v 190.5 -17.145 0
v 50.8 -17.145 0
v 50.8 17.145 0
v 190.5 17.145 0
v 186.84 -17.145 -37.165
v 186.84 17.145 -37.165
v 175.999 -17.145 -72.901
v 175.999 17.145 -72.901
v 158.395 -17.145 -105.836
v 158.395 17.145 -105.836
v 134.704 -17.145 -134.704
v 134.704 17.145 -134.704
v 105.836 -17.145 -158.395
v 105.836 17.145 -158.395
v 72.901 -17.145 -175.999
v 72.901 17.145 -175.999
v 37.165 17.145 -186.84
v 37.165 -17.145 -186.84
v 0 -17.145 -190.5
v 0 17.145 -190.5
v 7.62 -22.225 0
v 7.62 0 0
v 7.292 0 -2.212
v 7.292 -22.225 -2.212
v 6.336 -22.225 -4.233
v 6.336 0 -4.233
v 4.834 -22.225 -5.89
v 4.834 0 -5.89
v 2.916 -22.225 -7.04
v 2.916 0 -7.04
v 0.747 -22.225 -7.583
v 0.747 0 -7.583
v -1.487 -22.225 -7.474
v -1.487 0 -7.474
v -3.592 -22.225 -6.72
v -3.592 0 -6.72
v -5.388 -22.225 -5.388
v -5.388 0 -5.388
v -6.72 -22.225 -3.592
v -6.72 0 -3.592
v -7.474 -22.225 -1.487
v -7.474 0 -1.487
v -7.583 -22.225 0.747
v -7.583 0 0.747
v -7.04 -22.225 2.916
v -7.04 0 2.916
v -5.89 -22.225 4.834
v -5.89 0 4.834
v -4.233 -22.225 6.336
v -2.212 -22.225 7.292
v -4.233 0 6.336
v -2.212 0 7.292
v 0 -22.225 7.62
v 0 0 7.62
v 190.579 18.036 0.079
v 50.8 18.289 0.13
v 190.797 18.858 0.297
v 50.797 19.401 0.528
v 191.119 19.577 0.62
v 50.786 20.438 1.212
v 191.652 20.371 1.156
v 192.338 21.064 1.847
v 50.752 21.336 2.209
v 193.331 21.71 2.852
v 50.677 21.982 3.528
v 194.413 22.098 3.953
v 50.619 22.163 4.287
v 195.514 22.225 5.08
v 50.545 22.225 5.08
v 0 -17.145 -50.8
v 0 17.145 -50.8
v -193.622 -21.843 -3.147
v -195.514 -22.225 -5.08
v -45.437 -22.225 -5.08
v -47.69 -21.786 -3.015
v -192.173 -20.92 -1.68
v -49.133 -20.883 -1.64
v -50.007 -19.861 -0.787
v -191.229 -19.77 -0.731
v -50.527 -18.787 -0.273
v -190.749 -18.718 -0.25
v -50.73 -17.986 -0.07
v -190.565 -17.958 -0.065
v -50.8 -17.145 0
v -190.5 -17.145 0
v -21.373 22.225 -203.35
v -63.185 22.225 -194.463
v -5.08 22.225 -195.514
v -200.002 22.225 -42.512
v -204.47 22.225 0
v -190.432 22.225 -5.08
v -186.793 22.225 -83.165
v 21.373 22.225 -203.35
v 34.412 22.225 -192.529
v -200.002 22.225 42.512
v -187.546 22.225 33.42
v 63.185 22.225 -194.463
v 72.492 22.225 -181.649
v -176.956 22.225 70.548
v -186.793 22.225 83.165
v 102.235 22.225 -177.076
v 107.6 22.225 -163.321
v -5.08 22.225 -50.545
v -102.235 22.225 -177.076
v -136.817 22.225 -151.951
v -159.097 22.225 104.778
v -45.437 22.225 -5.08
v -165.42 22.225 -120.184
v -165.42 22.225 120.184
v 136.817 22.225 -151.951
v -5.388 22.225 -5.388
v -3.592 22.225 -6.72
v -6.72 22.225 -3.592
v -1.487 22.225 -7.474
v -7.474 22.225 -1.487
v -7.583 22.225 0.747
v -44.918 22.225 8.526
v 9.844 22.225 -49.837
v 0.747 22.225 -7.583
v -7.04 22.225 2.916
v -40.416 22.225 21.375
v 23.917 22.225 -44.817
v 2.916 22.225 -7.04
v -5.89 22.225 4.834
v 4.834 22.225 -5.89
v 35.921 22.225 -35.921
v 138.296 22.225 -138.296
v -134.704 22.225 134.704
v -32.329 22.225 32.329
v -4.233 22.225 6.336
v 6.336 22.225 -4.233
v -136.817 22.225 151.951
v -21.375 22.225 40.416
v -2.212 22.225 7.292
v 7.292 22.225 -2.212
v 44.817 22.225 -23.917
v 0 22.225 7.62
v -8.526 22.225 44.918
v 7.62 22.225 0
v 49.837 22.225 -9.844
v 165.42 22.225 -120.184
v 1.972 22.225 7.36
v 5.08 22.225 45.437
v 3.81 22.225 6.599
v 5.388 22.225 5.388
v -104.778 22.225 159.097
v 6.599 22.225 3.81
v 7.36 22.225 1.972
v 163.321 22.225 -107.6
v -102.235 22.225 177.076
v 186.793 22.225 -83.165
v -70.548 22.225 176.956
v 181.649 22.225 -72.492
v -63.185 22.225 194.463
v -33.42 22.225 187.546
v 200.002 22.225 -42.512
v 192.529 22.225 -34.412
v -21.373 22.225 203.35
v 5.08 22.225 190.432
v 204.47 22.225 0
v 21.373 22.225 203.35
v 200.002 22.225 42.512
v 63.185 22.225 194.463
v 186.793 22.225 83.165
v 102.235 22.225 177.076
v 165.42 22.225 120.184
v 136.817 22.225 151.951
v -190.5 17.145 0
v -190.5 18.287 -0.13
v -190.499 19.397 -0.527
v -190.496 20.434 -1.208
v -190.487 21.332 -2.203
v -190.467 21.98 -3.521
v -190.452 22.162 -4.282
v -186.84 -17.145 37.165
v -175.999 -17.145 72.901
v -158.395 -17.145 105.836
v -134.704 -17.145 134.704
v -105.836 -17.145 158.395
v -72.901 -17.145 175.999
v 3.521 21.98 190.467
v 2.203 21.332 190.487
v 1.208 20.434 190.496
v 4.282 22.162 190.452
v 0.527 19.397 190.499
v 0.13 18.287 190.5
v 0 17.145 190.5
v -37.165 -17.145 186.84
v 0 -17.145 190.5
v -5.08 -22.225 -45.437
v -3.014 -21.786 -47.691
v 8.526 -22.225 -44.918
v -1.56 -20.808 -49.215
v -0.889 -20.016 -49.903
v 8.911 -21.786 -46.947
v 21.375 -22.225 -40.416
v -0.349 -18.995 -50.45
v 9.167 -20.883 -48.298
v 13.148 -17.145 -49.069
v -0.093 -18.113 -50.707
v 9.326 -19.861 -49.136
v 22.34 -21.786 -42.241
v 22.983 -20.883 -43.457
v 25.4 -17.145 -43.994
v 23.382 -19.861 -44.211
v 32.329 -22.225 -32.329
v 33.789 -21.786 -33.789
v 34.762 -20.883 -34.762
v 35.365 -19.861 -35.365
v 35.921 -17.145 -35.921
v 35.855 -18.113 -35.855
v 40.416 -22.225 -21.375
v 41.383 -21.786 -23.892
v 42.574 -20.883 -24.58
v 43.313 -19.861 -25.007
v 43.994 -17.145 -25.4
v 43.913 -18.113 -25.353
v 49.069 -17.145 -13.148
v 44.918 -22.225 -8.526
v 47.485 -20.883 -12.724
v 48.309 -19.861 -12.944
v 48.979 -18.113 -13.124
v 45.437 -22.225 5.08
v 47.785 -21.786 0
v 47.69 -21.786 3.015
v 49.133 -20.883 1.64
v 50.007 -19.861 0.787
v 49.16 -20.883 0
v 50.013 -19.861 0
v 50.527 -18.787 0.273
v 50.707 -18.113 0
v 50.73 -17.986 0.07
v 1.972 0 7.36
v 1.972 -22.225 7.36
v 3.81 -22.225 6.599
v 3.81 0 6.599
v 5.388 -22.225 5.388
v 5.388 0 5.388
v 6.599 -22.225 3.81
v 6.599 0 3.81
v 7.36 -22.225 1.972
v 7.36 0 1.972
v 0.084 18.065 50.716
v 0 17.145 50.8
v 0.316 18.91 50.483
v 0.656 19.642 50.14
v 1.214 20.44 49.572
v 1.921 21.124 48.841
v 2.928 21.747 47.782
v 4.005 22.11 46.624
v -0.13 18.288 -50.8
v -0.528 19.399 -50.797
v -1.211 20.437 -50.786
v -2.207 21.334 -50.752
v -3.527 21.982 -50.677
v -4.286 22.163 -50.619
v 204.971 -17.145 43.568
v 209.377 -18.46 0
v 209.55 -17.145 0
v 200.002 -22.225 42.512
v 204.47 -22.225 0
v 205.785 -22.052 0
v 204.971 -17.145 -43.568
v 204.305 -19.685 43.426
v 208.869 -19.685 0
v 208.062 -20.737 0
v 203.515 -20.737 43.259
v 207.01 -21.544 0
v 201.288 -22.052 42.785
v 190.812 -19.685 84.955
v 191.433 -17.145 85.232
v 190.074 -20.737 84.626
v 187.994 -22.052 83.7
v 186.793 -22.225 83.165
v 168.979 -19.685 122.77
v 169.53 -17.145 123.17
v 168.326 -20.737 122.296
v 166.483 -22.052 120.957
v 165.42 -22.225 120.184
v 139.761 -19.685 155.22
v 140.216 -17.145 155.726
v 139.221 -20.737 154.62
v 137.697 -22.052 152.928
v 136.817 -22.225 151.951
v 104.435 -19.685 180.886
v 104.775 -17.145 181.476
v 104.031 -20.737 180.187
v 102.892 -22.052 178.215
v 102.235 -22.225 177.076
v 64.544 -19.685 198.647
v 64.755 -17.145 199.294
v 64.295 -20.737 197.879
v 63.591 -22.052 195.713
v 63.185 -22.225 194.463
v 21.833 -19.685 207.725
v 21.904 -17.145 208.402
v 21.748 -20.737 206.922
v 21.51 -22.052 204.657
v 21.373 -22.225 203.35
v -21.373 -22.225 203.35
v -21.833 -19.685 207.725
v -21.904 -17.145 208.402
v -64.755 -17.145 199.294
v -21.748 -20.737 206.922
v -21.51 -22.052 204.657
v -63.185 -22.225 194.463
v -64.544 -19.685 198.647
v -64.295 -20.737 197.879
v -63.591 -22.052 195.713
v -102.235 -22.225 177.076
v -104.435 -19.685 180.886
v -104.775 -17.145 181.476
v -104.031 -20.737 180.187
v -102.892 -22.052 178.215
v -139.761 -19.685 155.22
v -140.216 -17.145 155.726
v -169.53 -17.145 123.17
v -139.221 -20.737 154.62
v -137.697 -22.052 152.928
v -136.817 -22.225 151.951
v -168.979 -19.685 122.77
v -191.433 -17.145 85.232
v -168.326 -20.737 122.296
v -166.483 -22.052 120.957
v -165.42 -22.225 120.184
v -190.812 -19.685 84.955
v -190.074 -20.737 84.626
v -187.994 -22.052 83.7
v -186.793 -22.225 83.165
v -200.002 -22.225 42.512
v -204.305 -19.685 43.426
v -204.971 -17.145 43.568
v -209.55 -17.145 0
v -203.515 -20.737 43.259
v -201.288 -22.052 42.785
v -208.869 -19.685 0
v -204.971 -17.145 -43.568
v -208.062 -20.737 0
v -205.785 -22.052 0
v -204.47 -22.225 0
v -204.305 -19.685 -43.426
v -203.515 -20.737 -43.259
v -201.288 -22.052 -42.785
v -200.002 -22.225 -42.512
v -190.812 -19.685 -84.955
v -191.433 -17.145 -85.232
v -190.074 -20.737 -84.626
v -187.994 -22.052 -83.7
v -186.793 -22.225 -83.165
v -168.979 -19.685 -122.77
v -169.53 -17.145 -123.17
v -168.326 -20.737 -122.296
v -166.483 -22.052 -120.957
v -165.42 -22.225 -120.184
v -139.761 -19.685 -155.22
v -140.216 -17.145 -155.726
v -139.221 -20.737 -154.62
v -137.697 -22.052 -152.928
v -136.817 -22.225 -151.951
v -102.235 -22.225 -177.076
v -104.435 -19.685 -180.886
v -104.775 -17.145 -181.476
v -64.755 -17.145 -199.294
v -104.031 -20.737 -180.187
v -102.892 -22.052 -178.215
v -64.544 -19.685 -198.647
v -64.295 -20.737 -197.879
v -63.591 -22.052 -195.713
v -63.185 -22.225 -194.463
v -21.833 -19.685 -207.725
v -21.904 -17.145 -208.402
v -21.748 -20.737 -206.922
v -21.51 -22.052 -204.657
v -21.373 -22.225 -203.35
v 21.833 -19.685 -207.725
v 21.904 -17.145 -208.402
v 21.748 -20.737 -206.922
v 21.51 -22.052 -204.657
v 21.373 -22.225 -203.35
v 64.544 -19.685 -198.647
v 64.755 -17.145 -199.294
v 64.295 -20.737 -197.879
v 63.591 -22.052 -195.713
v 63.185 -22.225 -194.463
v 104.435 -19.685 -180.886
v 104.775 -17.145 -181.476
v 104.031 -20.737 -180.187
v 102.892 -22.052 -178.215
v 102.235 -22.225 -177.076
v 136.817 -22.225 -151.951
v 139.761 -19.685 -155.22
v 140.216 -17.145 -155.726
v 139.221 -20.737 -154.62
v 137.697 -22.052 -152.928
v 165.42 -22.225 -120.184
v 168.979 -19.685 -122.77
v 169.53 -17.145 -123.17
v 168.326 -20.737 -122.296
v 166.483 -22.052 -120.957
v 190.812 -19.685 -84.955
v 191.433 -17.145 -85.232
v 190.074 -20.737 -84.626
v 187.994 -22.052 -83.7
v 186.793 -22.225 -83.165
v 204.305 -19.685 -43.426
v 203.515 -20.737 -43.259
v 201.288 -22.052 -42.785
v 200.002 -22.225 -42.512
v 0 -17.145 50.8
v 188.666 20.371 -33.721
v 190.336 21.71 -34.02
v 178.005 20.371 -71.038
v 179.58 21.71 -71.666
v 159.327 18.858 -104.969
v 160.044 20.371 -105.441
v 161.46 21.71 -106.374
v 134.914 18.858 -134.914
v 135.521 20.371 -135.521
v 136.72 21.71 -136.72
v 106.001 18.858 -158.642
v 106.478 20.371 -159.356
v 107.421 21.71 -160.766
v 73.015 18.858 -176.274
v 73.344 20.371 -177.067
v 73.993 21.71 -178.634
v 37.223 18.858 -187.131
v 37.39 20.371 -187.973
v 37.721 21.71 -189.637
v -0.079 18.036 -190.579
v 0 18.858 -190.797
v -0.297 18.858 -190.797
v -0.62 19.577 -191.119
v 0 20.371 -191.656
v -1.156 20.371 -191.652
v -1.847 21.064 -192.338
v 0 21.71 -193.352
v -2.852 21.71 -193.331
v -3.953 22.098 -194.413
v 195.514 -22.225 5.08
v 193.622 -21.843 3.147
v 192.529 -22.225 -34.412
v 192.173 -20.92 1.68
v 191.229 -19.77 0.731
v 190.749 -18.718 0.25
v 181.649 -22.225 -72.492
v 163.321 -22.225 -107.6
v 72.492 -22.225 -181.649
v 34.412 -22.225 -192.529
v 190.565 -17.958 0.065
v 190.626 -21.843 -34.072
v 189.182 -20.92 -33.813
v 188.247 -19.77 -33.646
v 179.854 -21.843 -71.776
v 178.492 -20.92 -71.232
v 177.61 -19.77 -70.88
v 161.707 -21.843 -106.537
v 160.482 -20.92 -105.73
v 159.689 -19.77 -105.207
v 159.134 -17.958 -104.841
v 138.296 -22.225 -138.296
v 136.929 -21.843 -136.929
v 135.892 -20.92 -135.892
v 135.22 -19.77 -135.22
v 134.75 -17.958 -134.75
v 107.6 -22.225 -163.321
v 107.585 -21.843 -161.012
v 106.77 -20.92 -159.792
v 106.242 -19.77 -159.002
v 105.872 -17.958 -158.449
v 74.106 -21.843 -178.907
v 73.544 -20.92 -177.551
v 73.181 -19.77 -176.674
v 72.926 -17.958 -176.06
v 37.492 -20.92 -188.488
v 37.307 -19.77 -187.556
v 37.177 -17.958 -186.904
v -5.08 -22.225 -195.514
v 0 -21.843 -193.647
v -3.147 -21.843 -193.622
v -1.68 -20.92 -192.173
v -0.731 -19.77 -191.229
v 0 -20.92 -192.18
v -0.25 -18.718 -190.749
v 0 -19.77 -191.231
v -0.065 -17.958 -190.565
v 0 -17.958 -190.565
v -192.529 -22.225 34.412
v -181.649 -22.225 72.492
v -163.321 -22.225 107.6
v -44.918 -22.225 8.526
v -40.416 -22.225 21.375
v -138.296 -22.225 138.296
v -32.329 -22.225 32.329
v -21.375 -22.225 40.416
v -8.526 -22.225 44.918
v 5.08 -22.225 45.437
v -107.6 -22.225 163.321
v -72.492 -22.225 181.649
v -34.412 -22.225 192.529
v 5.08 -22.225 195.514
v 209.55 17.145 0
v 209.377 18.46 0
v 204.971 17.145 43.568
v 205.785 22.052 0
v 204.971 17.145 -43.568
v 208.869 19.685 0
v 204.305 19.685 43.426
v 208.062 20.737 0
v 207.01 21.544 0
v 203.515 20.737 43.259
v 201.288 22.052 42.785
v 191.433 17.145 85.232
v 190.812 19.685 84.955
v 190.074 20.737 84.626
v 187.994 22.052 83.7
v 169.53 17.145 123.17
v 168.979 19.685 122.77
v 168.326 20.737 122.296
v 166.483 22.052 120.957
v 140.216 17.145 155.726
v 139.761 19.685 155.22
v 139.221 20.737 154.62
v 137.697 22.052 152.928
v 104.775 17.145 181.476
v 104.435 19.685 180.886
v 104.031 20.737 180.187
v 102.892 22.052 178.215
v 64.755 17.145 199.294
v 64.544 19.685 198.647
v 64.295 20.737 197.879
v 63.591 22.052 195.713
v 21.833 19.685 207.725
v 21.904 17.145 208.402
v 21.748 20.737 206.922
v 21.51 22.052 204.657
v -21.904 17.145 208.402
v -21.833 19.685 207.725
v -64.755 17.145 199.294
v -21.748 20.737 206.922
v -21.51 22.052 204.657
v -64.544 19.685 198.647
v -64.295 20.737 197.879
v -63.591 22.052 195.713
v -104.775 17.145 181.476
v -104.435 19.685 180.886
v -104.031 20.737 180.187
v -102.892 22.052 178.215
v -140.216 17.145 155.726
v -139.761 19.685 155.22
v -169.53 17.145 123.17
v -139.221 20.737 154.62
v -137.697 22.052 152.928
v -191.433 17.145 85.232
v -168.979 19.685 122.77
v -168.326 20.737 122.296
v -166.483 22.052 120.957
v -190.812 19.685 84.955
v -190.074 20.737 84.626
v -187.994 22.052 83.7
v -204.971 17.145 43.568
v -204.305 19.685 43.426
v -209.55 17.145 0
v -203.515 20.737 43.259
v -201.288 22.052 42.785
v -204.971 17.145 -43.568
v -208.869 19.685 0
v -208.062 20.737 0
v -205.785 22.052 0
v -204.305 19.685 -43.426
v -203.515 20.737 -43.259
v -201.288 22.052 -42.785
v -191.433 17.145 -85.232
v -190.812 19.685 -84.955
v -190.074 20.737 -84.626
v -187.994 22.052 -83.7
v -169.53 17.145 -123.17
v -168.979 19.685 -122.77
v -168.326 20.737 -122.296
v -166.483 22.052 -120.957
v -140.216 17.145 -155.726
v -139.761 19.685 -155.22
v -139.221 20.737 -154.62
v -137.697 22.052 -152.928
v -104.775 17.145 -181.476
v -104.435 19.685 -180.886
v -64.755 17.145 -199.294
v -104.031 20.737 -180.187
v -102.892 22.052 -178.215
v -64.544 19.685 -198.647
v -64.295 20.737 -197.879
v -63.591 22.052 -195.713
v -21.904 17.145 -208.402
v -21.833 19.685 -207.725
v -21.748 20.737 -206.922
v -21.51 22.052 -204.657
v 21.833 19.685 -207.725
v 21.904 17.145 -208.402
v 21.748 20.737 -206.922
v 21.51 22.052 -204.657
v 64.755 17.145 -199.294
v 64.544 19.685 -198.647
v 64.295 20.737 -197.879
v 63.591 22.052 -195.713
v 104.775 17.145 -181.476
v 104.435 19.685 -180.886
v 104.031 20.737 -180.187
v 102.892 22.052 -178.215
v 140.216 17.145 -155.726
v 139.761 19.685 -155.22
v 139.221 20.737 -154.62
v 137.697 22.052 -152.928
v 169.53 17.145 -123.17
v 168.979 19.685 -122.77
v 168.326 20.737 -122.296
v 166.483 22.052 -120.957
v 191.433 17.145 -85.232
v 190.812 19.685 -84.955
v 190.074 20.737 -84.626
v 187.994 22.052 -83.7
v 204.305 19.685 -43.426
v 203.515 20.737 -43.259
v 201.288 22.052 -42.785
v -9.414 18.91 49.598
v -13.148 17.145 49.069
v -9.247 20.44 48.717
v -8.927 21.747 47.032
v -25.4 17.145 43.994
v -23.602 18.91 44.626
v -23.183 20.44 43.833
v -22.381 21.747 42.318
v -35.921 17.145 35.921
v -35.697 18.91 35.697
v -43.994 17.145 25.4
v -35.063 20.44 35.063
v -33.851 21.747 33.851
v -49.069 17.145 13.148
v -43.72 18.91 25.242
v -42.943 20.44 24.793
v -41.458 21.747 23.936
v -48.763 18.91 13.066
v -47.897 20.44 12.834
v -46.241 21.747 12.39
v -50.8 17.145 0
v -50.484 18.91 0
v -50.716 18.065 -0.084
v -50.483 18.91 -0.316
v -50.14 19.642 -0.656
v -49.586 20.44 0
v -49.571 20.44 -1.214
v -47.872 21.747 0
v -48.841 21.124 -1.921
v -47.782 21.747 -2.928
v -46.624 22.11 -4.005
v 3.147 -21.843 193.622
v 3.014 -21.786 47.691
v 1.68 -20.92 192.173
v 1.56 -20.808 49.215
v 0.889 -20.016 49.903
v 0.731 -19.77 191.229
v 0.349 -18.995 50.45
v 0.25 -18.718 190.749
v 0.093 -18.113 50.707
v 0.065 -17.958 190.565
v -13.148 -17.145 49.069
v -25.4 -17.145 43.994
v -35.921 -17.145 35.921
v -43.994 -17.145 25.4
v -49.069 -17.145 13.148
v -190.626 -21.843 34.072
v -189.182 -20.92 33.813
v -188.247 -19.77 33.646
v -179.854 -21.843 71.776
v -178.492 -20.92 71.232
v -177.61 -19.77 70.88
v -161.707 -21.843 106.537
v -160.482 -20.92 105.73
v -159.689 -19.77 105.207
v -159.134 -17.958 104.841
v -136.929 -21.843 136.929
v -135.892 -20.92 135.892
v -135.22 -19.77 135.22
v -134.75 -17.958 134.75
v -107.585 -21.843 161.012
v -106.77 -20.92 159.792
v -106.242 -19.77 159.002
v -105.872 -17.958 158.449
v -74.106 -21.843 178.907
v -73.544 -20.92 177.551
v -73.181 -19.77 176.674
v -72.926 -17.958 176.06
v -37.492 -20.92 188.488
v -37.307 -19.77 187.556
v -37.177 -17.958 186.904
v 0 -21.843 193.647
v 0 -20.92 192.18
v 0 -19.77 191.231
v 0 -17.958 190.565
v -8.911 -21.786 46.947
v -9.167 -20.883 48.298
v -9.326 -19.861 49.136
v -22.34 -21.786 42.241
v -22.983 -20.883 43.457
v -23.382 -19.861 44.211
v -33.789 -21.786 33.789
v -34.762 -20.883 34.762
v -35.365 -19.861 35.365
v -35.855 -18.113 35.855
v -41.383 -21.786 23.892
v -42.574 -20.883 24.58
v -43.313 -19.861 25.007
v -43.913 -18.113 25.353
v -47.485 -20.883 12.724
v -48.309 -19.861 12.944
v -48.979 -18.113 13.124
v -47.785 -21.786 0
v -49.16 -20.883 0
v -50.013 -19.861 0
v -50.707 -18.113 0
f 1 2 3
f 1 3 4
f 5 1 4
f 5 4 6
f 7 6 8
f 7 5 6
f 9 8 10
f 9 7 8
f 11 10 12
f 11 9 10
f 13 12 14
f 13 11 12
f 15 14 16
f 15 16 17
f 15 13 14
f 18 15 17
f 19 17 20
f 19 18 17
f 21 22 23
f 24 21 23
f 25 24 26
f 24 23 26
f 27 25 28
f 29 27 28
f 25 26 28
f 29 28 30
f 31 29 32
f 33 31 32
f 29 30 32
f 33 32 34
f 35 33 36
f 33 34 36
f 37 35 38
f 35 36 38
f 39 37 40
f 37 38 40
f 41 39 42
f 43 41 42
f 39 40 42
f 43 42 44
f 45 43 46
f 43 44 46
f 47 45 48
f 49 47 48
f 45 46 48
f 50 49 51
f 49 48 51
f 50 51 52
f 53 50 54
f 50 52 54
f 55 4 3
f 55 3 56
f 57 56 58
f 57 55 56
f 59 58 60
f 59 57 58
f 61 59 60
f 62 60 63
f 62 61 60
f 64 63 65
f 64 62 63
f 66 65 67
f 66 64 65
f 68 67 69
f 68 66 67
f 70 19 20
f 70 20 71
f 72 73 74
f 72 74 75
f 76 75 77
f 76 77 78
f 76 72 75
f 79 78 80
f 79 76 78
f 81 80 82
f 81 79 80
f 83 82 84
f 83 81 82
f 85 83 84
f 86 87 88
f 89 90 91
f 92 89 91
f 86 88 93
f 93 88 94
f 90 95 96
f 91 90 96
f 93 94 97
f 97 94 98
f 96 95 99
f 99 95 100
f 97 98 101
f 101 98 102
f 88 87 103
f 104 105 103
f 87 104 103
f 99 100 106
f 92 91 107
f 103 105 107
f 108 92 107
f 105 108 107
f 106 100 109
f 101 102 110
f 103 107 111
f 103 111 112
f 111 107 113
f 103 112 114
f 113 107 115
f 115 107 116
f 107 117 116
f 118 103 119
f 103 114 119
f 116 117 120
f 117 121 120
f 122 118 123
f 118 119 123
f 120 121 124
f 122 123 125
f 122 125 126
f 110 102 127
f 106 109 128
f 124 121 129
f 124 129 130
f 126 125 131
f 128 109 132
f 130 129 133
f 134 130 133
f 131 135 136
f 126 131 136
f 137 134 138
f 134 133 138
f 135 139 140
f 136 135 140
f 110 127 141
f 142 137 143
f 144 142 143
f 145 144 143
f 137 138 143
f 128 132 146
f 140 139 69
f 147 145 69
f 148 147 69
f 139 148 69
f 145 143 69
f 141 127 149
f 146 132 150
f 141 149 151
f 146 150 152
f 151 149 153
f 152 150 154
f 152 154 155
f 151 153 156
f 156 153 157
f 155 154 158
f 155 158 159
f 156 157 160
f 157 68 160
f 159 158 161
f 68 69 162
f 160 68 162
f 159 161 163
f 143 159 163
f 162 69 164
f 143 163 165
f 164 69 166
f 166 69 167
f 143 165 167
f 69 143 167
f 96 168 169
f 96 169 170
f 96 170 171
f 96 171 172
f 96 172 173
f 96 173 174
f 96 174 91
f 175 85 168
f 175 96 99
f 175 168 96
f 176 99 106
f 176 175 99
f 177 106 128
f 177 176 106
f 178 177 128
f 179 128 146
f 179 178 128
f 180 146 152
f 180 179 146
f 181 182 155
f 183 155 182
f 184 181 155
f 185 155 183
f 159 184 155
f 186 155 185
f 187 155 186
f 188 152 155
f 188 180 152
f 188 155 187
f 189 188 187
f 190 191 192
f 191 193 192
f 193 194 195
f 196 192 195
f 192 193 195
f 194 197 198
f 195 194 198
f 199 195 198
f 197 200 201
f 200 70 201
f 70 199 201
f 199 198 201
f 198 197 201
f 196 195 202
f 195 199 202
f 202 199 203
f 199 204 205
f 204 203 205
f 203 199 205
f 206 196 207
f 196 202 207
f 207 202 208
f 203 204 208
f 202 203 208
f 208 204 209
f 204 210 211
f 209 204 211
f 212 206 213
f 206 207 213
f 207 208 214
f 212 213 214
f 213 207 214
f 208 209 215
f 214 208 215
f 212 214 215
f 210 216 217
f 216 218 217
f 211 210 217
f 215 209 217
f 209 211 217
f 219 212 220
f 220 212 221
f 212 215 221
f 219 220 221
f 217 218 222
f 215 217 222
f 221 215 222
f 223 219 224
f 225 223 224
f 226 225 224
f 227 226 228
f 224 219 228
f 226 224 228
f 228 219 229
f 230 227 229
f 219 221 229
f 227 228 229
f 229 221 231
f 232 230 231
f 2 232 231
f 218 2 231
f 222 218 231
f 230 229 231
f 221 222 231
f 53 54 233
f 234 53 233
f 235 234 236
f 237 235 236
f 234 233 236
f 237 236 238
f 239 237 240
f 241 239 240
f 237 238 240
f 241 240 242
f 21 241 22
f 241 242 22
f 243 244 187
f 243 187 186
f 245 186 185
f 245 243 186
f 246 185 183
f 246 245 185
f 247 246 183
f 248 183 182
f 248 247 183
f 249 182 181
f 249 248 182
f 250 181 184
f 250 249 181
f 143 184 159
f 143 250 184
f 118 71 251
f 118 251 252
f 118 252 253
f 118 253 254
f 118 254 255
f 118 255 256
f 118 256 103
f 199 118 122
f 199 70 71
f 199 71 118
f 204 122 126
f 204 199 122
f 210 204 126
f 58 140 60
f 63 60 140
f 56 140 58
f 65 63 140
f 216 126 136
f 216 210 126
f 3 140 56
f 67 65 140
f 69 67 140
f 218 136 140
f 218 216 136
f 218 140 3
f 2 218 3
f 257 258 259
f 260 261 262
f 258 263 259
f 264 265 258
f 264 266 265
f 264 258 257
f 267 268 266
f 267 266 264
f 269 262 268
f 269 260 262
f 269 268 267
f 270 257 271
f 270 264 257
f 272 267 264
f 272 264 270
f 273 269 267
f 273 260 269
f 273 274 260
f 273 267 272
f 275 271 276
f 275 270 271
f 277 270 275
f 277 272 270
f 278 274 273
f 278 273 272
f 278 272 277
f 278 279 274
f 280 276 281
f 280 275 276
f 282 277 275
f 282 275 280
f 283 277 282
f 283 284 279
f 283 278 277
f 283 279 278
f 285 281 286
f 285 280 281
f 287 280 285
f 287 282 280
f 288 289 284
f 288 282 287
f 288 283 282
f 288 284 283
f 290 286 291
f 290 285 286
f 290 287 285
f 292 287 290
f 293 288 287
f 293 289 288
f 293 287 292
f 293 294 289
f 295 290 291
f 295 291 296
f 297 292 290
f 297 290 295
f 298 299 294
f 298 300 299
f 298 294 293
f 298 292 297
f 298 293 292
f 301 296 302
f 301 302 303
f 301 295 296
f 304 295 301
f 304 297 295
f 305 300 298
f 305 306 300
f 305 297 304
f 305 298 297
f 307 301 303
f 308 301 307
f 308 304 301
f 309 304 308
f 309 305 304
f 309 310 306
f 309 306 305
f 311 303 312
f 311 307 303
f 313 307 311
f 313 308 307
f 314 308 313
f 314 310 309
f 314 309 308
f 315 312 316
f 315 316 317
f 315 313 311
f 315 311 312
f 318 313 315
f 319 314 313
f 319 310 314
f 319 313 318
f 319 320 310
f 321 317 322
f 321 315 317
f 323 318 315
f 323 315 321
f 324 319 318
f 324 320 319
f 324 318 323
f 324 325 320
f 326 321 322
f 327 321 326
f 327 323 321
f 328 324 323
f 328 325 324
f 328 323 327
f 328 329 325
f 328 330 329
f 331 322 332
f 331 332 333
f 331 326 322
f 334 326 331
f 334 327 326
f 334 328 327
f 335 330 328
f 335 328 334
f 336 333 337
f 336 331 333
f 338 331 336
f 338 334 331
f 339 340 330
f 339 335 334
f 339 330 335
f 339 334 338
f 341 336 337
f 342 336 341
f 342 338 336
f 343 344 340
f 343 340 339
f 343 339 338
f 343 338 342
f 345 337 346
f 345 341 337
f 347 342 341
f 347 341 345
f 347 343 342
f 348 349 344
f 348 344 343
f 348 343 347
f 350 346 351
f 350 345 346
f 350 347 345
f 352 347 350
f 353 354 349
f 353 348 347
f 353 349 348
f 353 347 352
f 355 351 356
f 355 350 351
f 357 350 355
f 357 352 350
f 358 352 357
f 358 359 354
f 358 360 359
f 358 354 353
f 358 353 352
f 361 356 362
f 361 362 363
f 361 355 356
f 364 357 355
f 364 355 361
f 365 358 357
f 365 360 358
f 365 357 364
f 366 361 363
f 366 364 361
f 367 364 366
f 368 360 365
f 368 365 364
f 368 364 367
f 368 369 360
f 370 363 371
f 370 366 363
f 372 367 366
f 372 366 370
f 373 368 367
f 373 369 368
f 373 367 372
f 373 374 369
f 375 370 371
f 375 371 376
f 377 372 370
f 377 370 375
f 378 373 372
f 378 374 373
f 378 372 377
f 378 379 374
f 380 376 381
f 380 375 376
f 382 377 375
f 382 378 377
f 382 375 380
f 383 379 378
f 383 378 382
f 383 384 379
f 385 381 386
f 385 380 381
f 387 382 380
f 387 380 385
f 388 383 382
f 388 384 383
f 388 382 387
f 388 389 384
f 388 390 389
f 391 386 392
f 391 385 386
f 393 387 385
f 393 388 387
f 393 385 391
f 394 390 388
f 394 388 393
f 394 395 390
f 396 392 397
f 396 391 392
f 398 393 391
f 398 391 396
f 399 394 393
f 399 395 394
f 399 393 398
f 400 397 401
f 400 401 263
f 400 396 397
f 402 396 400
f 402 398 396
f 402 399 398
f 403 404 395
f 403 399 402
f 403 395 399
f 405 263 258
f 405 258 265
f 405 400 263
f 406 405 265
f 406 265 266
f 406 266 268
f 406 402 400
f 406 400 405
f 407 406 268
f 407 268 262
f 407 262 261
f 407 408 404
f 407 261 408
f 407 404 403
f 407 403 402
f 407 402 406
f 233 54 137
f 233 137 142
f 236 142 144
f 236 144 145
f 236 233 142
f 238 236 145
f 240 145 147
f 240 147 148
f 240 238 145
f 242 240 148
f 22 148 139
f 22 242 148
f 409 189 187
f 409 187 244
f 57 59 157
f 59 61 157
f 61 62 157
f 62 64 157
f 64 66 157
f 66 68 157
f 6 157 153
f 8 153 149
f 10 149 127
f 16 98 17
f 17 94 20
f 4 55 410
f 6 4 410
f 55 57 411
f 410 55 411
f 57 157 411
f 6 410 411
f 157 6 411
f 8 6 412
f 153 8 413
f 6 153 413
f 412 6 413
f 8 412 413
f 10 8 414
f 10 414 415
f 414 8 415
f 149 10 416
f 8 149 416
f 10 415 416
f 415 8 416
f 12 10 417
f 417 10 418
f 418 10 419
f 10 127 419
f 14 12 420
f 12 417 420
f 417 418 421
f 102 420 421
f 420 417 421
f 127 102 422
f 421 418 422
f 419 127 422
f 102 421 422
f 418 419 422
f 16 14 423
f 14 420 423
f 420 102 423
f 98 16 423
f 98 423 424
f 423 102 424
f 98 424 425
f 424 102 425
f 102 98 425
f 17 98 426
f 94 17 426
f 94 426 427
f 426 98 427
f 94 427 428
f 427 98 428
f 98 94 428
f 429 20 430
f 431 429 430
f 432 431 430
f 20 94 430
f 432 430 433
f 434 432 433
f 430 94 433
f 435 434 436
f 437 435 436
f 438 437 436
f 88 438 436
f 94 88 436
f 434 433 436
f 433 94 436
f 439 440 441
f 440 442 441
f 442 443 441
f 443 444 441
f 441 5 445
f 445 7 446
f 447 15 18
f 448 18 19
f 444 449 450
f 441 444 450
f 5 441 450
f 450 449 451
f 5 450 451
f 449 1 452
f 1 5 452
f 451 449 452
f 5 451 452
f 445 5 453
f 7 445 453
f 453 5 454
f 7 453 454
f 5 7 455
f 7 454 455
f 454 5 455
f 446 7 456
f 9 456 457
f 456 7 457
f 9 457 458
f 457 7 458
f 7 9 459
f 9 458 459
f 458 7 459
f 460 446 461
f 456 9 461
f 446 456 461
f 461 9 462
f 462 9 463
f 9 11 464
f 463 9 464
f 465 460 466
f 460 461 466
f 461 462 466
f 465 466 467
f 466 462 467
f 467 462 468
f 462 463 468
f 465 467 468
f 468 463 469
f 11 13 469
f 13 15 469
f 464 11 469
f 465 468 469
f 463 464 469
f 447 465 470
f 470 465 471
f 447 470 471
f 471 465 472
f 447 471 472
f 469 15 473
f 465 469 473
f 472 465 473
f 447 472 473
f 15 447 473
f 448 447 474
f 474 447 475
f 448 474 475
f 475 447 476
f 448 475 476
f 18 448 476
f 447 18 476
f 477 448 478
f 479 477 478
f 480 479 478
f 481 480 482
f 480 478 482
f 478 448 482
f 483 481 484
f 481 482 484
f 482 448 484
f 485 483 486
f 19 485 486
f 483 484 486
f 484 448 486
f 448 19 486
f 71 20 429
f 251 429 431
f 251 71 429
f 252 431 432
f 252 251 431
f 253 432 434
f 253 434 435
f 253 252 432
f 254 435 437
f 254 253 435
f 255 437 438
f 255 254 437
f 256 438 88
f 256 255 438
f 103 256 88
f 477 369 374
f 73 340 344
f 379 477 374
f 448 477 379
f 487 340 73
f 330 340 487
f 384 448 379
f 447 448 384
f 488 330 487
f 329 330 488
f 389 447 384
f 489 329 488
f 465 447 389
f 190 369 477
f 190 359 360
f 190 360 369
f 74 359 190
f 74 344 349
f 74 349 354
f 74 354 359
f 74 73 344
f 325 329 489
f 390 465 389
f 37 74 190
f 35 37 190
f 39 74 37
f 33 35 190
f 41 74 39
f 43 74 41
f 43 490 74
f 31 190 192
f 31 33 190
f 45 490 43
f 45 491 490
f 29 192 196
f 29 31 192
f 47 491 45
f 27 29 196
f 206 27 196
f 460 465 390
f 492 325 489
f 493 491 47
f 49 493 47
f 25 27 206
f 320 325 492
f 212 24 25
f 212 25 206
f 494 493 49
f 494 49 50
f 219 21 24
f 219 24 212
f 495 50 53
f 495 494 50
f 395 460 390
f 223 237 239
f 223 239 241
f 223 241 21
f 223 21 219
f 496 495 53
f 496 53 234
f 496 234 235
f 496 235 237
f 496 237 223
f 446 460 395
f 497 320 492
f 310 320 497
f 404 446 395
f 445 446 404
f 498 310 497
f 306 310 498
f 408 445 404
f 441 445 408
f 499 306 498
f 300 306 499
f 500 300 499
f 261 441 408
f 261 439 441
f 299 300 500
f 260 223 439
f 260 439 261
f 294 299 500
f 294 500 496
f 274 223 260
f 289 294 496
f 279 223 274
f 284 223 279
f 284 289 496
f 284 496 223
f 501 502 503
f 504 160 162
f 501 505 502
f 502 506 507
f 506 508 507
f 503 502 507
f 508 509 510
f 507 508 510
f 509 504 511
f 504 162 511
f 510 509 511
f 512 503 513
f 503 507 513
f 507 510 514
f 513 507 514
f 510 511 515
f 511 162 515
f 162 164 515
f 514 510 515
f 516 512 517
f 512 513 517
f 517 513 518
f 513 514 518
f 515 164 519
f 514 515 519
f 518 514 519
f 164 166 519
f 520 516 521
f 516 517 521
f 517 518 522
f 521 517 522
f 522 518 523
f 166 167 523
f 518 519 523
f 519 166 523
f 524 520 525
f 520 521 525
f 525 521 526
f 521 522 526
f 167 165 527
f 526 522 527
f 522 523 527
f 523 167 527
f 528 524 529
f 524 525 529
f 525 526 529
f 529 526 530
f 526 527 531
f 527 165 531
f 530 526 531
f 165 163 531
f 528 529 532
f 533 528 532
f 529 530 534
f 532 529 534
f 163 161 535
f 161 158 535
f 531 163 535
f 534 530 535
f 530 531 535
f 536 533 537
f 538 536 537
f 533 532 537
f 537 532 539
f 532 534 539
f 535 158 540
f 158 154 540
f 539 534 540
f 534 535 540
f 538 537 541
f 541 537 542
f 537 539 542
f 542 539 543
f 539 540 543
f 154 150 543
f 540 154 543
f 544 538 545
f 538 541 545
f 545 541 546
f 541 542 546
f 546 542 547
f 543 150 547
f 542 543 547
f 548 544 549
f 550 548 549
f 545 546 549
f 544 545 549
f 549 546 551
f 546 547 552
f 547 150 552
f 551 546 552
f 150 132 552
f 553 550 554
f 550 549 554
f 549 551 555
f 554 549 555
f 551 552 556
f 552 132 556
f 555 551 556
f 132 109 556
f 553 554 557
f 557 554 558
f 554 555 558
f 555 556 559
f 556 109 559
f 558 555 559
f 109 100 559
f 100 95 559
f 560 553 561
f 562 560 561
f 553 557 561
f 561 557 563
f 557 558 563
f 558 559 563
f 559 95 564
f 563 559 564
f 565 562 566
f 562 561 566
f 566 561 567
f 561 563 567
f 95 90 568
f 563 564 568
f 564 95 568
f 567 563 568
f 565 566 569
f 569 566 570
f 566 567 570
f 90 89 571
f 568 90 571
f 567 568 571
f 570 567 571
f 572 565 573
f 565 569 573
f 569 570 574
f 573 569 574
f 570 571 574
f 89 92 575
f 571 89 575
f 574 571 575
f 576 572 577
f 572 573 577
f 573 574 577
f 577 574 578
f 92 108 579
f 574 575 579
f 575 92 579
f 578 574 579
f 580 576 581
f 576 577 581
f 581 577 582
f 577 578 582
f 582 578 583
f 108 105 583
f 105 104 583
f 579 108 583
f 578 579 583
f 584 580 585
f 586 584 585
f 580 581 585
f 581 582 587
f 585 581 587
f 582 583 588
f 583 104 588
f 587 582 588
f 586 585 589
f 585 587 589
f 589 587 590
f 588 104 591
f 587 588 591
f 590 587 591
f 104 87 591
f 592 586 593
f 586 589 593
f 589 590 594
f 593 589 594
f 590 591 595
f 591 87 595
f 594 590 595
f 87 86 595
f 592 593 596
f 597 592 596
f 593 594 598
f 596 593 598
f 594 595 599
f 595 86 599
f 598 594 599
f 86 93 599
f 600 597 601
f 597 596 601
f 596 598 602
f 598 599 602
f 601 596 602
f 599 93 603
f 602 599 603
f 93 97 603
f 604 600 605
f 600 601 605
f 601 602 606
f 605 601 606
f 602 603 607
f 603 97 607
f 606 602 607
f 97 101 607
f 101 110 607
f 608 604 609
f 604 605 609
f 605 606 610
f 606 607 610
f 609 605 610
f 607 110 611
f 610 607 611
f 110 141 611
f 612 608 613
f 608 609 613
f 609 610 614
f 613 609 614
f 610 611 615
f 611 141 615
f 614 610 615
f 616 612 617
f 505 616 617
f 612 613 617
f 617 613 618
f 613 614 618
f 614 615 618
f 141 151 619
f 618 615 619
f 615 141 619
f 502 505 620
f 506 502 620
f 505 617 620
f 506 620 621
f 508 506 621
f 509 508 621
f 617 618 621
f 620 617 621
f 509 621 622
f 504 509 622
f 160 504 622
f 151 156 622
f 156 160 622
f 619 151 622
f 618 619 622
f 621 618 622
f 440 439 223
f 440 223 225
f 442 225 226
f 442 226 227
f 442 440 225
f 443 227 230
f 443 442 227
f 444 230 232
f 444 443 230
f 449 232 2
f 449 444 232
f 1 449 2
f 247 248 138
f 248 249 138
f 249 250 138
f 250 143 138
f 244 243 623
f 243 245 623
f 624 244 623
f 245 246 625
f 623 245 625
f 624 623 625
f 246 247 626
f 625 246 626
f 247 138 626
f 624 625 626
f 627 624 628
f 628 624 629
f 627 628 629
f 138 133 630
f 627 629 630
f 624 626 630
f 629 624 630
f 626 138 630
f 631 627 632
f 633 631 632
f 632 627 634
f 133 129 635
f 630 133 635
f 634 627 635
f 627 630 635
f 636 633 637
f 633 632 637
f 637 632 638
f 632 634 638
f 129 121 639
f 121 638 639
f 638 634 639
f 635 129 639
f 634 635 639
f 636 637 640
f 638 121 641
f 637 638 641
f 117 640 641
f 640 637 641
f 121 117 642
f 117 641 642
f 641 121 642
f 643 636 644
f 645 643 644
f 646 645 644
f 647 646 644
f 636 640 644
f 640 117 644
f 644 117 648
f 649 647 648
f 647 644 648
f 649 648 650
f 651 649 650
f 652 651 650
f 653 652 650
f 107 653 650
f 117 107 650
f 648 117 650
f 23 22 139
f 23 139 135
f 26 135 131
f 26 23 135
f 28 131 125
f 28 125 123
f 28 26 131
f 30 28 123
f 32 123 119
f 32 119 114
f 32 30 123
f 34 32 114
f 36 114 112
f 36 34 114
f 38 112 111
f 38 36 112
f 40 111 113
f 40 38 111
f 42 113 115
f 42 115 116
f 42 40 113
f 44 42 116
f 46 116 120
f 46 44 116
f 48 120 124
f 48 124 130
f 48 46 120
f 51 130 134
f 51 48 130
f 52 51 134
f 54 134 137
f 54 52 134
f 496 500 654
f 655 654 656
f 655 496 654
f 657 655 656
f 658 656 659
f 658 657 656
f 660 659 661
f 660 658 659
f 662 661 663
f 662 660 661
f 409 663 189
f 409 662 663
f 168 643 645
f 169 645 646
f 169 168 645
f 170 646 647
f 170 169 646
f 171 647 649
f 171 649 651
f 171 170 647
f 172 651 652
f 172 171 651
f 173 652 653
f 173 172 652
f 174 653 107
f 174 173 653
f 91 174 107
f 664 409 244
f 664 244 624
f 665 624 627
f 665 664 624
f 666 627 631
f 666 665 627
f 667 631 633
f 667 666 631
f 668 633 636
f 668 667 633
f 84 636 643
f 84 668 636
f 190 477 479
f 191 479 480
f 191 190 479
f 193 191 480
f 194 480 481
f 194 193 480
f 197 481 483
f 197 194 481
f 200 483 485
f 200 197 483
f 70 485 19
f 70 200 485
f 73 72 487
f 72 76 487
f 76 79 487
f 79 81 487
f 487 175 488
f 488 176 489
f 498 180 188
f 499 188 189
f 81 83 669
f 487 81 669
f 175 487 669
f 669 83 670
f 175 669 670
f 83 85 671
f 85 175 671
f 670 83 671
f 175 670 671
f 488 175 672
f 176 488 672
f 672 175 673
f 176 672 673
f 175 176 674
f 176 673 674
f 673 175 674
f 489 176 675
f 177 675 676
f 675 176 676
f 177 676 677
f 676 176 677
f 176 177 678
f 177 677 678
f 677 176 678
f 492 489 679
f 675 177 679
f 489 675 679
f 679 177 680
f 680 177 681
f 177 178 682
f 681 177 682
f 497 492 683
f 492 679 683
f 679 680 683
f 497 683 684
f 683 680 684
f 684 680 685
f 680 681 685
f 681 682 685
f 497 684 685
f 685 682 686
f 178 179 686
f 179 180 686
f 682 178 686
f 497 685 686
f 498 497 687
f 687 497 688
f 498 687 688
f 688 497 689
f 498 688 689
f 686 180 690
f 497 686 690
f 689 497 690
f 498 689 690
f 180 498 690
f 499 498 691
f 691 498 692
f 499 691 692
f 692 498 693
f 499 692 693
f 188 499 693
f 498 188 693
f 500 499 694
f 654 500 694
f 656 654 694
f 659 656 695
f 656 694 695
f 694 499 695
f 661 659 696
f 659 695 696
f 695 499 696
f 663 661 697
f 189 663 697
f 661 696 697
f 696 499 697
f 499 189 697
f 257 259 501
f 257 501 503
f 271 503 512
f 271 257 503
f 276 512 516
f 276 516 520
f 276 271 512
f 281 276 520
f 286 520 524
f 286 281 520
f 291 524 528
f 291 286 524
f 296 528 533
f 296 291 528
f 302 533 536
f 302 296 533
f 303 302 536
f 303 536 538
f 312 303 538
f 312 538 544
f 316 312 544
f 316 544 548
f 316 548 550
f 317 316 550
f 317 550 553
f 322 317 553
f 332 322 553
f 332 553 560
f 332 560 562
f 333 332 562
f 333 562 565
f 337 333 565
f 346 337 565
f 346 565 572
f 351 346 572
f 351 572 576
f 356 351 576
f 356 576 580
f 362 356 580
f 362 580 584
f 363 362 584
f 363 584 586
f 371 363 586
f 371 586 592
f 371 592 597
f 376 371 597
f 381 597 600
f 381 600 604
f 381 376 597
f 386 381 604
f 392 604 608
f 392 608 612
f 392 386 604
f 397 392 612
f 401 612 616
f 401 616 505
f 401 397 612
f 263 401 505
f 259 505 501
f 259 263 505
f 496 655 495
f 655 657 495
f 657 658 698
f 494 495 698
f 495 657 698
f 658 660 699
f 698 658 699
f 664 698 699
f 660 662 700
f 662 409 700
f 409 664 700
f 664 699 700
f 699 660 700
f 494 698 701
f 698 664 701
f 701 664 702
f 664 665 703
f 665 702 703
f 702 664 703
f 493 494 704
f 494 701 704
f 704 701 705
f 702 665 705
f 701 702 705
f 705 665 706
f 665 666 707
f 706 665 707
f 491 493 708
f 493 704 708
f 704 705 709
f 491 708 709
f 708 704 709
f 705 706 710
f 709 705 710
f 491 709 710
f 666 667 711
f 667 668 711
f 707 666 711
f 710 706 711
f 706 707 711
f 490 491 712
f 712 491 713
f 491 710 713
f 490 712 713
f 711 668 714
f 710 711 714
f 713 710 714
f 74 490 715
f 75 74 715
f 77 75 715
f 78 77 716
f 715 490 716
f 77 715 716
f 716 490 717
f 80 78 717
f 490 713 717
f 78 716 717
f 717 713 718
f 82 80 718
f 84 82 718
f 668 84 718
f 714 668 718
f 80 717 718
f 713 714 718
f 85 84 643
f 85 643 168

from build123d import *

# Parameters (mm, degrees)
F0_R     = 209.55
F1_DEPTH = 22.225
F3_R     = 5.08


# Not quite as in the source:
# - a feature of the source that left no trace in its solid (it failed there, or was rolled back) is left out


with BuildPart() as f1:
    # F0 (on Front) → F1 (new body, symmetric)
    with BuildSketch(Plane.XZ):
        Circle(F0_R)
        with BuildLine():
            ThreePointArc((0, 190.5), (134.703841816, 134.703841816), (190.5, 0))
            ThreePointArc((190.5, 0), (134.703841816, -134.703841816), (0, -190.5))
            ThreePointArc((0, -190.5), (-134.703841816, -134.703841816), (-190.5, 0))
            ThreePointArc((-190.5, 0), (-134.703841816, 134.703841816), (0, 190.5))
        make_face(mode=Mode.SUBTRACT)
        with BuildLine():
            ThreePointArc((0, -50.8), (35.9210244843, -35.9210244843), (50.8, 0))
            ThreePointArc((50.8, 0), (35.9210244843, 35.9210244843), (0, 50.8))
            ThreePointArc((0, 50.8), (-35.9210244843, 35.9210244843), (-50.8, 0))
            ThreePointArc((-50.8, 0), (-35.9210244843, -35.9210244843), (0, -50.8))
        make_face()
        with BuildLine():
            ThreePointArc((0, 7.62), (5.3881536726, 5.3881536726), (7.62, 0))
            ThreePointArc((7.62, 0), (-5.3881536726, -5.3881536726), (0, 7.62))
        make_face(mode=Mode.SUBTRACT)
        with BuildLine():
            Line((0, -190.5), (0, -50.8))
            ThreePointArc((0, -50.8), (-35.9210244843, -35.9210244843), (-50.8, 0))
            Line((-50.8, 0), (-190.5, 0))
            ThreePointArc((-190.5, 0), (-134.703841816, -134.703841816), (0, -190.5))
        make_face()
        with BuildLine():
            ThreePointArc((0, 50.8), (35.9210244843, 35.9210244843), (50.8, 0))
            Line((50.8, 0), (190.5, 0))
            ThreePointArc((190.5, 0), (134.703841816, 134.703841816), (0, 190.5))
            Line((0, 190.5), (0, 50.8))
        make_face()
    extrude(amount=F1_DEPTH, both=True)

    # F3
    f3_edges = [f1.edges().sort_by_distance(p)[0] for p in [
        (0, -22.225, -120.65),
        (0, 22.225, -120.65),
        (120.65, -22.225, 0),
        (-120.65, -22.225, 0),
        (0, -22.225, 120.65),
        (-209.55, 22.225, 0),
        (-209.55, -22.225, 0),
        (-134.703842, -22.225, 134.703842),
        (-35.921024, -22.225, 35.921024),
        (134.703842, -22.225, -134.703842),
        (35.921024, -22.225, -35.921024),
        (120.65, 22.225, 0),
        (134.703842, 22.225, -134.703842),
        (-120.65, 22.225, 0),
        (-35.921024, 22.225, 35.921024),
        (0, 22.225, 120.65),
    ]]
    fillet(f3_edges, radius=F3_R)


solid = f1.part
